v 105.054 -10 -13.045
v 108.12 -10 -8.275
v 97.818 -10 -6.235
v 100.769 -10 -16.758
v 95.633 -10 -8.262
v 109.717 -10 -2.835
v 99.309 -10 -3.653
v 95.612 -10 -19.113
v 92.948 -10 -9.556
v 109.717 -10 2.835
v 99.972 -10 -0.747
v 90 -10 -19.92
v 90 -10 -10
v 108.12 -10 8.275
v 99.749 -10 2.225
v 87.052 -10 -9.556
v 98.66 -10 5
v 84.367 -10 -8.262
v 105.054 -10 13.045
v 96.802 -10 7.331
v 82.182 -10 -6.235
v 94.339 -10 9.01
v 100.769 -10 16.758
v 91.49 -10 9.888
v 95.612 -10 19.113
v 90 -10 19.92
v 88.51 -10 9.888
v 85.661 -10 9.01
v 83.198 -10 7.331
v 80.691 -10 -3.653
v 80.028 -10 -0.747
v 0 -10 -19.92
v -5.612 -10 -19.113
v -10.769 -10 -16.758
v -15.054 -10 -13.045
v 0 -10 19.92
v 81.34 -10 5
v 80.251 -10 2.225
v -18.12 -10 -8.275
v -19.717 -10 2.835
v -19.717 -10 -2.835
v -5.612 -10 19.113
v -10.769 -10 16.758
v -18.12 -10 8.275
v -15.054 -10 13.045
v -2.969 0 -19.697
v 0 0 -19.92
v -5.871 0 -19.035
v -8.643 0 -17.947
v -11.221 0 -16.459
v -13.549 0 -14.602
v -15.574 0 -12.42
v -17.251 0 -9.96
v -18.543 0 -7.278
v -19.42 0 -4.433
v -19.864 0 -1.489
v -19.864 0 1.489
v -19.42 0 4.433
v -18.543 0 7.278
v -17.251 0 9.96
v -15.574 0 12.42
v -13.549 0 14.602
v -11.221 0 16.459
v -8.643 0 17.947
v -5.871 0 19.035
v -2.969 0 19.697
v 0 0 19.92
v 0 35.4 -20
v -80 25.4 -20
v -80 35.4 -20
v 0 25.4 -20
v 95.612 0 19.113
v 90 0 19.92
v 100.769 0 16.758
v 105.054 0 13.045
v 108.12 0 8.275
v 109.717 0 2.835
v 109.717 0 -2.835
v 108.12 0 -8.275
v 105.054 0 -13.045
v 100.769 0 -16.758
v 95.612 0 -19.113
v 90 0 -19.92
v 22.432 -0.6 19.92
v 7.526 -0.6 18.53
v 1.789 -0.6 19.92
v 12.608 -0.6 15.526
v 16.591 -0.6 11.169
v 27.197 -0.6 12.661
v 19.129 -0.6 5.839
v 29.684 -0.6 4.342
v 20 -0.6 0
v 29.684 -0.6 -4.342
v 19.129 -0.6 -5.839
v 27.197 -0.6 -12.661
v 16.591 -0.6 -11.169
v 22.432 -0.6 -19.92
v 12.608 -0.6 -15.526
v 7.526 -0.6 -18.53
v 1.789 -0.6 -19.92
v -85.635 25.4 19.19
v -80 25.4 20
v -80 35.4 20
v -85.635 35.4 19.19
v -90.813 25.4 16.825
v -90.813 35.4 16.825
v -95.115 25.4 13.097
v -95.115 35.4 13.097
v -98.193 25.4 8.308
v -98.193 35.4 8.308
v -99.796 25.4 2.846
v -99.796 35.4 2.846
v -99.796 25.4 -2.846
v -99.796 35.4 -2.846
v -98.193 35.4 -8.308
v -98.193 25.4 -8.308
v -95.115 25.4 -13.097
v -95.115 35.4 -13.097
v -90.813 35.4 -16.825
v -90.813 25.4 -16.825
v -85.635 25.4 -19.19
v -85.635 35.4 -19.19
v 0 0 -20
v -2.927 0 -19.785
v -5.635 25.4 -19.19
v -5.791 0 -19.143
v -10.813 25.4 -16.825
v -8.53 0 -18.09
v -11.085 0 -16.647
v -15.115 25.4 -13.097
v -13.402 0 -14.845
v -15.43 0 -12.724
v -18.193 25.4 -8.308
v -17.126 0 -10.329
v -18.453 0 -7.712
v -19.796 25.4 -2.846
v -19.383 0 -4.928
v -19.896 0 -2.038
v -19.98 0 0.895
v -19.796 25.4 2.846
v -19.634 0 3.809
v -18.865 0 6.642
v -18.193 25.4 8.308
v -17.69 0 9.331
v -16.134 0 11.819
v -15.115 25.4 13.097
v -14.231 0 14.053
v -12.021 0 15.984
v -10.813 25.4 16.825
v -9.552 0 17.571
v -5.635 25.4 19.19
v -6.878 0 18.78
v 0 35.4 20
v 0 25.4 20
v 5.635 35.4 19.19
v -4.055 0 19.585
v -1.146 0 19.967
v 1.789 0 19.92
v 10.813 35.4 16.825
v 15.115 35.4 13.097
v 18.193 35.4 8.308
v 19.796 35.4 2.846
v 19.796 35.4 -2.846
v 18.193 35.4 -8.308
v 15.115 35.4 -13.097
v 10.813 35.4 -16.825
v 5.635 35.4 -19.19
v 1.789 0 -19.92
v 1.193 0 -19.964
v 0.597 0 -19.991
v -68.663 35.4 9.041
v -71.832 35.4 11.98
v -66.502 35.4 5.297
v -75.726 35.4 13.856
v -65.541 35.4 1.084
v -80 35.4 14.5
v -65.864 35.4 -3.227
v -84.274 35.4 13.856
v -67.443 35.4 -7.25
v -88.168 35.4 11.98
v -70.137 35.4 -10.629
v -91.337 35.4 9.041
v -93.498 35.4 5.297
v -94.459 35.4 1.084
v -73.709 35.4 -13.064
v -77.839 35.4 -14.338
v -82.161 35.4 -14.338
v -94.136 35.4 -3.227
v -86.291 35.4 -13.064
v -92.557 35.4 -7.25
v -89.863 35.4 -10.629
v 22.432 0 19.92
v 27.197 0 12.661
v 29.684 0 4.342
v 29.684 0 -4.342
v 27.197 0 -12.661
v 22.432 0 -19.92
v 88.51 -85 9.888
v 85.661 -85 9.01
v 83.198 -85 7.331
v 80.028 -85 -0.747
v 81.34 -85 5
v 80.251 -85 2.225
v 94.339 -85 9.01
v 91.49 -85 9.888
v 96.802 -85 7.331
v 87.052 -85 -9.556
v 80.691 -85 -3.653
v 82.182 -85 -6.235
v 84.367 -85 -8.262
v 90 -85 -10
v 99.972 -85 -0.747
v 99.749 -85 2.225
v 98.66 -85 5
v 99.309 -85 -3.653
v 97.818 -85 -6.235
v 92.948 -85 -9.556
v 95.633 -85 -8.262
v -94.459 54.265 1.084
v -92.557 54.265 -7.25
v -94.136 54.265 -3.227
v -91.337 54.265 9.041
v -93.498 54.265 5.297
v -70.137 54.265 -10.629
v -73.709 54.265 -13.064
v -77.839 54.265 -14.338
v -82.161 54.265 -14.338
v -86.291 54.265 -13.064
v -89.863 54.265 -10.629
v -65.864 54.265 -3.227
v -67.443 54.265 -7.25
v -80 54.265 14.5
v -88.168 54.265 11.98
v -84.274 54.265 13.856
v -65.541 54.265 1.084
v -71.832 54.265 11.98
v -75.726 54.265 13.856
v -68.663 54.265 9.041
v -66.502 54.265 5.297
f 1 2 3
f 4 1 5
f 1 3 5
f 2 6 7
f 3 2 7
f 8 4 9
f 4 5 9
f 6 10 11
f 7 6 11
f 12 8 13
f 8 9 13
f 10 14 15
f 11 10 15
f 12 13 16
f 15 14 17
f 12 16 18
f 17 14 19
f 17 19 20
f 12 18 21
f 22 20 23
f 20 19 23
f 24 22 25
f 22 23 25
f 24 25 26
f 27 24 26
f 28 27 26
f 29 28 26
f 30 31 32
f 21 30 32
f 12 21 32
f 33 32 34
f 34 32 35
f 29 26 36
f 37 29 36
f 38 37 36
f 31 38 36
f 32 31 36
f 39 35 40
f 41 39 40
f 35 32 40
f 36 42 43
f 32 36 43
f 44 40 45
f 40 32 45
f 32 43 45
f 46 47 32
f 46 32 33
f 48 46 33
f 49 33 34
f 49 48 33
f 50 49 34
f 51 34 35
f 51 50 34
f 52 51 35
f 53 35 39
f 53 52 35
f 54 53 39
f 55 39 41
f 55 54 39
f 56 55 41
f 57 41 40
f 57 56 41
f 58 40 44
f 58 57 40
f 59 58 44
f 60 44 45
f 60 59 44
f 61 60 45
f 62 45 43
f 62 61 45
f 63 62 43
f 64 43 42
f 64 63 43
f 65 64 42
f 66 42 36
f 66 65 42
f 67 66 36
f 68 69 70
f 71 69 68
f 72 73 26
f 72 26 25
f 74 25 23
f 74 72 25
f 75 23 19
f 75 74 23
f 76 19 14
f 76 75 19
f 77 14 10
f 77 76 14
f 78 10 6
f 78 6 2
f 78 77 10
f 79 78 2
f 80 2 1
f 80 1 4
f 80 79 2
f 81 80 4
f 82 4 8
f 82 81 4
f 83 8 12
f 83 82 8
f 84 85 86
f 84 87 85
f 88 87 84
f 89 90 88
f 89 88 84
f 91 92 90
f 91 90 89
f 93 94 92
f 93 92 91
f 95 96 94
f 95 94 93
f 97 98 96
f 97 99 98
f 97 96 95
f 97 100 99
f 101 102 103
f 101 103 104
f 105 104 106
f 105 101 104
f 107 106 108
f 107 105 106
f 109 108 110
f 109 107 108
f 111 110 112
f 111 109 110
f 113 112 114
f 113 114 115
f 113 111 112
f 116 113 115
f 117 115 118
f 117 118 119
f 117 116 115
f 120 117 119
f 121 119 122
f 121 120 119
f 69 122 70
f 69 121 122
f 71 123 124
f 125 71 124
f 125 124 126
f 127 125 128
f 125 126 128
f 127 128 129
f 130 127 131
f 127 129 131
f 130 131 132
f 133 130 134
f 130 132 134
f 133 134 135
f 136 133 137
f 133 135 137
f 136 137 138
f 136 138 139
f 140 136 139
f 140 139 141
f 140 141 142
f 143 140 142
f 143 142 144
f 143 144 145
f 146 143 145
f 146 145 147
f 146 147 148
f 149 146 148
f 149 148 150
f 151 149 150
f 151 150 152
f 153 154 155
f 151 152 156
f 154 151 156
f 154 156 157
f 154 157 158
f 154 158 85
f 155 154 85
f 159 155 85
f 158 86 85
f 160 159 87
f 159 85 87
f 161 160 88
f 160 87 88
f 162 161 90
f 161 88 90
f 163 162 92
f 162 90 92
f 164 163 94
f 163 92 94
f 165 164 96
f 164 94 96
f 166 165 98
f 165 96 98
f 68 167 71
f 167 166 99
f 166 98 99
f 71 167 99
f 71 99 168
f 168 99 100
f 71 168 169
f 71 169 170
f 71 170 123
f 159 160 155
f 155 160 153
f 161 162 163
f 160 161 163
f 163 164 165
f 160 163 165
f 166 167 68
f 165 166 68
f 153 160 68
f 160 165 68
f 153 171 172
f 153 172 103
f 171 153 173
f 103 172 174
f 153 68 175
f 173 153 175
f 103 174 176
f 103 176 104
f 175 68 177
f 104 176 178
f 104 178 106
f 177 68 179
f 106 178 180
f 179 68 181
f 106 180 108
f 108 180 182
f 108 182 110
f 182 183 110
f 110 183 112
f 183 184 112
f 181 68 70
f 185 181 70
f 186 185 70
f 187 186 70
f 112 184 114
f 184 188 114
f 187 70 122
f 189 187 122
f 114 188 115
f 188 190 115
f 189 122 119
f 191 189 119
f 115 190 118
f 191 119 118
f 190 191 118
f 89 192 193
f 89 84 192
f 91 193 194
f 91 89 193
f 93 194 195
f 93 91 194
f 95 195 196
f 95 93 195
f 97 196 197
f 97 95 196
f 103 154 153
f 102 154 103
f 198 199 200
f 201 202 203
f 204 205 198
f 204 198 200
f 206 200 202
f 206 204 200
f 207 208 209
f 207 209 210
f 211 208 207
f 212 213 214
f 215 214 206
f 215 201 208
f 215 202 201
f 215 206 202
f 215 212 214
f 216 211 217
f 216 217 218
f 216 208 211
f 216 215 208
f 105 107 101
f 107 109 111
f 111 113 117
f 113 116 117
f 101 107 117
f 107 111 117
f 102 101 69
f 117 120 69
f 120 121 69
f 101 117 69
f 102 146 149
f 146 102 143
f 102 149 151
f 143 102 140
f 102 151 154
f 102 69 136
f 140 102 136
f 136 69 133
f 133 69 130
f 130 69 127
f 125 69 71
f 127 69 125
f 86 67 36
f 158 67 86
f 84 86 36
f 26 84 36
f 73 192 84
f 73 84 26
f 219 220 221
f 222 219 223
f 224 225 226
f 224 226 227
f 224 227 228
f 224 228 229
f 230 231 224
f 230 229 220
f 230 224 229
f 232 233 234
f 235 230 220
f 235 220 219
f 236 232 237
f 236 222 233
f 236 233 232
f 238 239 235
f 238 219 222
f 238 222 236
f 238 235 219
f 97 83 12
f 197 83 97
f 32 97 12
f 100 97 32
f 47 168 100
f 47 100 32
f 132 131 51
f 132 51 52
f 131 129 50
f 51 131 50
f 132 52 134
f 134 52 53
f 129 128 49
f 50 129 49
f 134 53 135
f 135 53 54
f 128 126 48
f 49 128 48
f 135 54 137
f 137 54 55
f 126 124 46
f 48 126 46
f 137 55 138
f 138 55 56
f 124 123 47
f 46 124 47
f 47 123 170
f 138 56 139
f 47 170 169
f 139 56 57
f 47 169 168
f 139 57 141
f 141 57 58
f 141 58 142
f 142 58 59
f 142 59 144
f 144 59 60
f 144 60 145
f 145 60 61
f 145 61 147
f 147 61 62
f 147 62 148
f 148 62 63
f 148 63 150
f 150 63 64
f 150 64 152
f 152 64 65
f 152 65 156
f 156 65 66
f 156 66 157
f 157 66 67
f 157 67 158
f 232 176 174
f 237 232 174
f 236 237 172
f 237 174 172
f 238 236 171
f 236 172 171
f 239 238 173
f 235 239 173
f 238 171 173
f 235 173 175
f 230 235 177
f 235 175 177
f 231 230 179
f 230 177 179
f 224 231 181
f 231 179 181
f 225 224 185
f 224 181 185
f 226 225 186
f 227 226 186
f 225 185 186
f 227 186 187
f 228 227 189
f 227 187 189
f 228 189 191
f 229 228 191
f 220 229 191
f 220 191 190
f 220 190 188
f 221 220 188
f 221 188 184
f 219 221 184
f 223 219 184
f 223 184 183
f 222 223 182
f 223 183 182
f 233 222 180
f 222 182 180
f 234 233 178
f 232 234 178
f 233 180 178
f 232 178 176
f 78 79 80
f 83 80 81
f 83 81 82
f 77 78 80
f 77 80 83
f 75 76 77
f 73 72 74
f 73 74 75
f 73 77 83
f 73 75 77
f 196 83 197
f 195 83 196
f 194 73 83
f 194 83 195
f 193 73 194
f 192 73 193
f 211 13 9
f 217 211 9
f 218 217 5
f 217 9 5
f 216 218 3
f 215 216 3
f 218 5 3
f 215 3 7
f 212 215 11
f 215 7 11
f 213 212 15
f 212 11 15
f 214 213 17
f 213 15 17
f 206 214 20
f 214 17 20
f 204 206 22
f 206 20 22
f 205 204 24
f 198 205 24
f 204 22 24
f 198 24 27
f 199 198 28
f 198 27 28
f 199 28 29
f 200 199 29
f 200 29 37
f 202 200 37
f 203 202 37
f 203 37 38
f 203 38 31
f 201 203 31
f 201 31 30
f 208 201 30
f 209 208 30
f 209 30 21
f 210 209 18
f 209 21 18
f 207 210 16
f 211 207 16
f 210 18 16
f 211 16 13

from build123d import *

# Parameters (mm, degrees)
SKETCH1_R           = 30
BOSS_EXTRUDE1_DEPTH = 25.4
BOSS_EXTRUDE2_DEPTH = 10
SKETCH3_R           = 14.5
BOSS_EXTRUDE3_DEPTH = 18.864779219
BOSS_EXTRUDE4_DEPTH = 10
SKETCH5_R           = 10
BOSS_EXTRUDE5_DEPTH = 75
CUT_EXTRUDE1_START  = -26
SKETCH7_R           = 30
SKETCH7_R_2         = 20
CUT_EXTRUDE1_DEPTH  = 26


with BuildPart() as part:
    # Sketch1 → Boss-Extrude1 (new body)
    with BuildSketch(Plane(origin=(0, 0, 0), x_dir=(1, 0, 0), z_dir=(0, 1, 0))):
        with Locations(Location((0, 0, 0), (0, 0, 270))):
            Circle(SKETCH1_R)
    extrude(amount=BOSS_EXTRUDE1_DEPTH)

    # Sketch2 → Boss-Extrude2 (add)
    with BuildSketch(Plane(origin=(0, 25.4, 0), x_dir=(1, 0, 0), z_dir=(0, 1, 0))):
        with BuildLine():
            Line((0, -20), (-80, -20))
            ThreePointArc((-80, -20), (-100, 0), (-80, 20))
            Line((-80, 20), (0, 20))
            ThreePointArc((0, 20), (20, 0), (0, -20))
        make_face()
    extrude(amount=BOSS_EXTRUDE2_DEPTH)

    # Sketch3 → Boss-Extrude3 (add)
    with BuildSketch(Plane(origin=(0, 35.4, 0), x_dir=(1, 0, 0), z_dir=(0, 1, 0))):
        with Locations(Location((-80, 0, 0), (0, 0, 270))):
            Circle(SKETCH3_R)
    extrude(amount=BOSS_EXTRUDE3_DEPTH)

    # Sketch4 → Boss-Extrude4 (add)
    with BuildSketch(Plane.XZ):
        with BuildLine():
            Line((0, 19.919861454), (90, 19.919861454))
            ThreePointArc((90, 19.919861454), (109.919861454, 0), (90, -19.919861454))
            Line((90, -19.919861454), (0, -19.919861454))
            ThreePointArc((0, -19.919861454), (-19.919861454, 0), (0, 19.919861454))
        make_face()
    extrude(amount=BOSS_EXTRUDE4_DEPTH)

    # Sketch5 → Boss-Extrude5 (add)
    with BuildSketch(Plane.XZ.offset(10)):
        with Locations(Location((90, 0, 0), (0, 0, 270))):
            Circle(SKETCH5_R)
    extrude(amount=BOSS_EXTRUDE5_DEPTH)

    # Sketch7 → Cut-Extrude1 (cut)
    with BuildSketch(Plane(origin=(0, 25.4, 0), x_dir=(1, 0, 0), z_dir=(0, 1, 0)).offset(CUT_EXTRUDE1_START)):
        Circle(SKETCH7_R)
        with Locations(Location((0, 0, 0), (0, 0, 90))):
            Circle(SKETCH7_R_2, mode=Mode.SUBTRACT)
    extrude(amount=CUT_EXTRUDE1_DEPTH, mode=Mode.SUBTRACT)


solid = part.part
